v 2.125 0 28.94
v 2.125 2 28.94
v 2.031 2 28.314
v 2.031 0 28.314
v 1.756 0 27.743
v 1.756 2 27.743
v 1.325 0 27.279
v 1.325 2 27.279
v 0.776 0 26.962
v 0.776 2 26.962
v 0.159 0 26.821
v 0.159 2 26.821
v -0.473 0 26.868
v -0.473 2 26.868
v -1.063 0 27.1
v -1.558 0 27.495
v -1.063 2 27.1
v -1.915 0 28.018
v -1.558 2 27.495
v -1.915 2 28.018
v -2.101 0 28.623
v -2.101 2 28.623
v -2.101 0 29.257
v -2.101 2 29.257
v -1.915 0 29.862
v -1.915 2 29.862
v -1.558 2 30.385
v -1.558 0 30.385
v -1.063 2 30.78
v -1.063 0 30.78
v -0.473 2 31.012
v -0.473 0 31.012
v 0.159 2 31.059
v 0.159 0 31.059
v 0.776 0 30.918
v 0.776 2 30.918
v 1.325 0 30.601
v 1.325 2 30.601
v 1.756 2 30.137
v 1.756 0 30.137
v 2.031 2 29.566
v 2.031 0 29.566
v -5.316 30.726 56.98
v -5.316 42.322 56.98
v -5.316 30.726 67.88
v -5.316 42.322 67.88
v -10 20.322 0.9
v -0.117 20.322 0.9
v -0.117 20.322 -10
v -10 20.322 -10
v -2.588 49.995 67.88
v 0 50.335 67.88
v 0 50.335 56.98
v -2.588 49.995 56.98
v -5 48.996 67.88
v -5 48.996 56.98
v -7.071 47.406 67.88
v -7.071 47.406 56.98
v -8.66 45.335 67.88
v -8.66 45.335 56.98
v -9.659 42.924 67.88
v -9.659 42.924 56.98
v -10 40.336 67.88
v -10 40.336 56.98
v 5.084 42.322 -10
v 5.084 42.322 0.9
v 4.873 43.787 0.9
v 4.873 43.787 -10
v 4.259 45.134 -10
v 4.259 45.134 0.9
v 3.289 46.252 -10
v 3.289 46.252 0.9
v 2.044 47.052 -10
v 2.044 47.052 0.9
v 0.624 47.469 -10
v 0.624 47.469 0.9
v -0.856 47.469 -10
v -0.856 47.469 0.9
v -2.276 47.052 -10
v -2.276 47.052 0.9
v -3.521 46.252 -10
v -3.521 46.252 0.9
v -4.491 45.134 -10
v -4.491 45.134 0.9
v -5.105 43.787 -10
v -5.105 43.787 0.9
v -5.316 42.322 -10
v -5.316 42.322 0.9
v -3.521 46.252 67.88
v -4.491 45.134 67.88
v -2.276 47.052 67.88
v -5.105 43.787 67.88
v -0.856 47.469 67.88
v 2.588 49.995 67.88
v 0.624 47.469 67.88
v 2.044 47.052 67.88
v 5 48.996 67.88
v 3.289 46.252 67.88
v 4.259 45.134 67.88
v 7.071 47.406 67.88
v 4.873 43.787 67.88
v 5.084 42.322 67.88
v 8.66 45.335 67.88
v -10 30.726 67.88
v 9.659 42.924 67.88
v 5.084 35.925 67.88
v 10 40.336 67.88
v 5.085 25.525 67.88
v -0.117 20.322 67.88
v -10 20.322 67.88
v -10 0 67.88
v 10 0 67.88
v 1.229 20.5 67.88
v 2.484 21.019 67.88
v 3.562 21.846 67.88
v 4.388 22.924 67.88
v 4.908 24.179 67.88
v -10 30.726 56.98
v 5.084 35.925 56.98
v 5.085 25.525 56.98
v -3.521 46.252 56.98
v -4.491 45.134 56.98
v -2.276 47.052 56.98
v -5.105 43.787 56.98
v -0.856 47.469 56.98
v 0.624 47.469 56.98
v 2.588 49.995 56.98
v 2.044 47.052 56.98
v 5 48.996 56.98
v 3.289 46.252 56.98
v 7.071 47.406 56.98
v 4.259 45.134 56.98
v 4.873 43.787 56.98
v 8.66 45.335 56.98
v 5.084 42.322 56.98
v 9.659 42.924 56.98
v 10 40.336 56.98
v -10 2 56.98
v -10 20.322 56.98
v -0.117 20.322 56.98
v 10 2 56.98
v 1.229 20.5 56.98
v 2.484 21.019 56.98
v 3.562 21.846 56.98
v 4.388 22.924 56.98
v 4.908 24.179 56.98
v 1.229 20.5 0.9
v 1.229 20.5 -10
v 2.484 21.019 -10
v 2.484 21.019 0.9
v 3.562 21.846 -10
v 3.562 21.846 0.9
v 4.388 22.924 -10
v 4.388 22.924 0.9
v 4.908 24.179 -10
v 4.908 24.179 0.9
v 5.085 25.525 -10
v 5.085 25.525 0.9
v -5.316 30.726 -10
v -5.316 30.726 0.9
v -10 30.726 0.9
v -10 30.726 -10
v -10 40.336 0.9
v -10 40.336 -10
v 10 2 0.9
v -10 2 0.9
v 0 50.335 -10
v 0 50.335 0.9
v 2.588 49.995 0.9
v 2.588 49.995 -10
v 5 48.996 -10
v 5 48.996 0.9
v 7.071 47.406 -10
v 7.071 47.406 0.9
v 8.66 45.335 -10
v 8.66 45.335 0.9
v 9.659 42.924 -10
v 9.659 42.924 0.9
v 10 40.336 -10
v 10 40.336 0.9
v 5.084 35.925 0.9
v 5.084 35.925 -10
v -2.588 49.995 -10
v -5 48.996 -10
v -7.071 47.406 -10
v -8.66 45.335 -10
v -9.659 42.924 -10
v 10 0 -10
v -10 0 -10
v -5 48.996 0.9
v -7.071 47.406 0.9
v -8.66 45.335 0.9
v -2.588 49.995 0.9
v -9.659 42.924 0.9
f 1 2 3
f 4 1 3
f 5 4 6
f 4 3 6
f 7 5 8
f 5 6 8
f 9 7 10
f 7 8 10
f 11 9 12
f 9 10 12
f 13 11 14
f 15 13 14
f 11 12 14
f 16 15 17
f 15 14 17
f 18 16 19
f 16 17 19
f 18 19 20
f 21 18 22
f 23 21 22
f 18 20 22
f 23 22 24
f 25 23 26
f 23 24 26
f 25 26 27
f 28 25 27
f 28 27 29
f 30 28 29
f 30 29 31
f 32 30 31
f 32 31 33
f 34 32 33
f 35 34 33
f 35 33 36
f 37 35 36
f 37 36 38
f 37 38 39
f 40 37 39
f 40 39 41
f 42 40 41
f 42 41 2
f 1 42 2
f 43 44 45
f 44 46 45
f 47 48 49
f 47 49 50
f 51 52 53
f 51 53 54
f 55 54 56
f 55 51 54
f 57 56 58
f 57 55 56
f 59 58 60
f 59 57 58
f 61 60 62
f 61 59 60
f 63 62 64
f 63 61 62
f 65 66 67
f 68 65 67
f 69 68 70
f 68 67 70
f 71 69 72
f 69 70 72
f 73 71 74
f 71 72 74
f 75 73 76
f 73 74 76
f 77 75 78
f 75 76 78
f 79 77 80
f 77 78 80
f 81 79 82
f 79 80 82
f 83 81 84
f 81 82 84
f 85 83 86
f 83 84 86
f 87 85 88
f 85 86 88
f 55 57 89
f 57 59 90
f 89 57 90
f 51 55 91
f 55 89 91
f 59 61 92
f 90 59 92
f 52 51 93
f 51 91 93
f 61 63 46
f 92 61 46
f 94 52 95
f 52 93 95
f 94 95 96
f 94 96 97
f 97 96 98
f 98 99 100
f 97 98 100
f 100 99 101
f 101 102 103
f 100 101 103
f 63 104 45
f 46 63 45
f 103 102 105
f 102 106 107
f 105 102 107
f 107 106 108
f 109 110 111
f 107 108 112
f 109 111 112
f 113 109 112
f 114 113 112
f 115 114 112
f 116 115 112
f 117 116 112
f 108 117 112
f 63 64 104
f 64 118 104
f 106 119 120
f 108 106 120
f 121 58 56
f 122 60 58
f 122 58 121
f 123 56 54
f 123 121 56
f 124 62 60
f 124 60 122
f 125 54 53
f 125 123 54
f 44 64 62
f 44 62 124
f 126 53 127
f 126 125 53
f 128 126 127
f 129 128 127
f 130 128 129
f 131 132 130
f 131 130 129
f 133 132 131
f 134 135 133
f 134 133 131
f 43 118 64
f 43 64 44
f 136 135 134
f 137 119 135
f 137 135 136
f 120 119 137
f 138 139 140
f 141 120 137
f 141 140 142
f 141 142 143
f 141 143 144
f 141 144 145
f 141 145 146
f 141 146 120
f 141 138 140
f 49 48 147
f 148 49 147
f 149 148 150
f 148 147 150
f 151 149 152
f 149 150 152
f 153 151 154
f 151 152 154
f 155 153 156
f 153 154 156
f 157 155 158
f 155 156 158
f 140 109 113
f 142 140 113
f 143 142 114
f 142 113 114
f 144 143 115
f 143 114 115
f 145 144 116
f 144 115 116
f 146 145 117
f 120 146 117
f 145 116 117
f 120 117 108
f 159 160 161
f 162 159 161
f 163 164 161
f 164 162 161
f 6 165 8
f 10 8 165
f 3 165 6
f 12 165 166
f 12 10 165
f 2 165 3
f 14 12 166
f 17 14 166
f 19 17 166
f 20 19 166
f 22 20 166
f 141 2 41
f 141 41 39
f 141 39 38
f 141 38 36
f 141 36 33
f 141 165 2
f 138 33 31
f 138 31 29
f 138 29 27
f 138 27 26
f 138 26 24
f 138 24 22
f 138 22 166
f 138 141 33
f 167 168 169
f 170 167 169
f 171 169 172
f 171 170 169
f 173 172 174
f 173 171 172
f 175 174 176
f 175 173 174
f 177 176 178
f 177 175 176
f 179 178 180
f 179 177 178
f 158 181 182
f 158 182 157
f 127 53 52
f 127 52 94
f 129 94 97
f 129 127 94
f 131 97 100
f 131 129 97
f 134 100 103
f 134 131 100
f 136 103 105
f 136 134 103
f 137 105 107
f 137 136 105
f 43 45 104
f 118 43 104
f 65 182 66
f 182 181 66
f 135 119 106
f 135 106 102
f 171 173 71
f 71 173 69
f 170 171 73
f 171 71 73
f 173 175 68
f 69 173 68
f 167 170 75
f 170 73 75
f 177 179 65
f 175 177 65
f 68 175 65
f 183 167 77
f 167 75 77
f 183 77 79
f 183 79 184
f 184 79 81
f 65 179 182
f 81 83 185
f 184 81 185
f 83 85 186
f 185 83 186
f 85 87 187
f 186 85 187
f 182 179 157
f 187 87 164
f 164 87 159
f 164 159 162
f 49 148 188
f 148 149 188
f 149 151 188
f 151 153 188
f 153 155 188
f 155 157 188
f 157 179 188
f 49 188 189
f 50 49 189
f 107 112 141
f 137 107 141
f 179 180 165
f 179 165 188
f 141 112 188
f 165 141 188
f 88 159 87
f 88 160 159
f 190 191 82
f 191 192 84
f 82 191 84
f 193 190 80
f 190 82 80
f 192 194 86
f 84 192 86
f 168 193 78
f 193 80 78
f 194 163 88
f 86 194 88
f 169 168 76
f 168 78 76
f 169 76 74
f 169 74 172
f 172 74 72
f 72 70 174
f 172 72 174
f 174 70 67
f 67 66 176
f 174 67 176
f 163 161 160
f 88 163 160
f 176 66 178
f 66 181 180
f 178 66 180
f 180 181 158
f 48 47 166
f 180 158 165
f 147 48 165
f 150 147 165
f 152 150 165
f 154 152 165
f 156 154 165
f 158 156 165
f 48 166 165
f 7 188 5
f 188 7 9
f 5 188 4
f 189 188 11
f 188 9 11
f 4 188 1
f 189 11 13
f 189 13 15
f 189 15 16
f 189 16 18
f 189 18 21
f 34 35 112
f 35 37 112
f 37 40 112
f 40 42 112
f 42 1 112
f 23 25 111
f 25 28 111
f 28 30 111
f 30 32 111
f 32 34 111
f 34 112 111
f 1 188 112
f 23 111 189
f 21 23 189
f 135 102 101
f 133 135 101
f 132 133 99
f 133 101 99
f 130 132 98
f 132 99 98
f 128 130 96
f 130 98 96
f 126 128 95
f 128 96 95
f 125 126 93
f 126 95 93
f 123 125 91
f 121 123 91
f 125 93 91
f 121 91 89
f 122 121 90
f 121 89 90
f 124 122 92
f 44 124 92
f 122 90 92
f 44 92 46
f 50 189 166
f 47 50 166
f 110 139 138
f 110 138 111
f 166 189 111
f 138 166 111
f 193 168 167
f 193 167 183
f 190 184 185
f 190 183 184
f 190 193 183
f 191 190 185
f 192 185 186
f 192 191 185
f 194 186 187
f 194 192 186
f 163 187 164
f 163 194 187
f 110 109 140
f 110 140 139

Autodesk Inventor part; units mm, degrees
ref_plane "YZ Plane" through (0, 0, 0) normal (1, 0, 0) x (0, 1, 0)
ref_plane "XZ Plane" through (0, 0, 0) normal (0, 1, 0) x (-1, 0, 0)
ref_plane "XY Plane" through (0, 0, 0) normal (0, 0, 1) x (1, 0, 0)
sketch "Sketch1" plane through (0, 0, 0) normal (0, 1, 0) x (-1, 0, 0)
  line L0 (10, 67.88) -> (-10, 67.88)
  line L1 (-10, 67.88) -> (-10, -10)
  line L2 (-10, -10) -> (10, -10)
  line L3 (10, -10) -> (10, 67.88)
  point P0 (0, 0)
  dimension "d0" = 20
  dimension "d1" = 77.88
extrude "Extrusion1" add sketch "Sketch1" along normal blind 2
sketch "Sketch2" plane through (0, 2, 0) normal (0, 1, 0) x (1, 0, 0)
  line L0 (-10, -67.88) -> (10, -67.88) projected
  line L1 (0, -67.88) -> (-6.35, -67.88)
  line L2 (-6.35, -56.98) -> (6.35, -56.98)
  line L3 (6.35, -67.88) -> (0, -67.88)
  line L4 (10, 10) -> (-10, 10) projected
  line L5 (-6.35, -0.9) -> (6.35, -0.9)
  line L6 (-6.35, 10) -> (6.35, 10)
  line L7 (-6.35, -67.88) -> (-10, -67.88)
  line L8 (-10, 10) -> (-10, -67.88) projected
  line L9 (-10, -56.98) -> (-6.35, -56.98)
  line L10 (6.35, -67.88) -> (10, -67.88)
  line L11 (10, -67.88) -> (10, 10) projected
  line L12 (10, -56.98) -> (6.35, -56.98)
  line L13 (6.35, -0.9) -> (10, -0.9)
  line L14 (10, 10) -> (6.35, 10)
  line L15 (10, -0.9) -> (10, 10)
  line L16 (10, -67.88) -> (10, -56.98)
  line L17 (-10, -67.88) -> (-10, -56.98)
  line L18 (-6.35, -0.9) -> (-10, -0.9)
  line L19 (-10, -0.9) -> (-10, 10)
  line L20 (-10, 10) -> (-6.35, 10)
  point P0 (0, 0)
  dimension "d4" = 6.35
  dimension "d5" = 10.9
  dimension "d6" = 12.7
  dimension "d7" = 10.9
extrude "Extrusion2" add sketch "Sketch2" along normal blind 48.3354 contours L8 L9 L2 L12 L11 L0 | L8 L4 L11 L13 L5 L18
sketch "Sketch9" plane through (-10, 0, 67.88) normal (0, 0, 1) x (1, 0, 0)
  arc A0 (15.084, 42.3223) -> (4.684, 42.3223) centre (9.884, 42.3223) ccw
  line L0 (15.084, 35.9247) -> (15.084, 42.3223)
  line L1 (4.684, 41.1247) -> (4.684, 42.3223)
  arc A1 (15.084, 42.3223) -> (4.684, 42.3223) centre (9.884, 42.3223) ccw
  line L2 (4.684, 42.3223) -> (4.684, 35.9247)
  line L3 (9.8827, 20.3222) -> (-0.0013, 20.3222)
  line L4 (-0.0013, 30.726) -> (-0.0013, 20.3222)
  line L5 (4.684, 35.9247) -> (4.684, 30.726)
  line L6 (15.084, 35.9247) -> (15.0853, 25.5254)
  arc A2 (15.084, 35.9247) -> (15.084, 35.9251) centre (9.884, 35.9243) ccw
  line L7 (4.684, 30.726) -> (-0.0013, 30.726)
  arc A3 (9.8827, 20.3222) -> (15.0853, 25.5254) centre (9.8827, 25.5248) ccw
  point P0 (10, 0)
fillet "Fillet4" radius 10 4 edges at (10, 50.3354, 62.43) (-10, 50.3354, 62.43) (-10, 50.3354, -4.55) (10, 50.3354, -4.55)
sketch "Sketch10" plane through (0, 2, 0) normal (0, 1, 0) x (1, 0, 0)
  line L0 (10, -67.88) -> (-10, -67.88) projected
  line L1 (-10, 10) -> (10, 10) projected
  line L2 (10, -56.98) -> (10, -0.9) projected
  line L3 (-10, -0.9) -> (-10, -56.98) projected
  line L4 (10, -28.94) -> (-10, -28.94)
  circle A0 centre (0, -28.94) radius 2.125
  point P0 (0, 0)
  dimension "d53" = 77.88
  dimension "d54" = 4.25
extrude "Extrusion10" cut sketch "Sketch10" against normal blind 2
extrude "Extrusion11" cut sketch "Sketch9" against normal through all
properties part number "6 Backet Adjustment"
